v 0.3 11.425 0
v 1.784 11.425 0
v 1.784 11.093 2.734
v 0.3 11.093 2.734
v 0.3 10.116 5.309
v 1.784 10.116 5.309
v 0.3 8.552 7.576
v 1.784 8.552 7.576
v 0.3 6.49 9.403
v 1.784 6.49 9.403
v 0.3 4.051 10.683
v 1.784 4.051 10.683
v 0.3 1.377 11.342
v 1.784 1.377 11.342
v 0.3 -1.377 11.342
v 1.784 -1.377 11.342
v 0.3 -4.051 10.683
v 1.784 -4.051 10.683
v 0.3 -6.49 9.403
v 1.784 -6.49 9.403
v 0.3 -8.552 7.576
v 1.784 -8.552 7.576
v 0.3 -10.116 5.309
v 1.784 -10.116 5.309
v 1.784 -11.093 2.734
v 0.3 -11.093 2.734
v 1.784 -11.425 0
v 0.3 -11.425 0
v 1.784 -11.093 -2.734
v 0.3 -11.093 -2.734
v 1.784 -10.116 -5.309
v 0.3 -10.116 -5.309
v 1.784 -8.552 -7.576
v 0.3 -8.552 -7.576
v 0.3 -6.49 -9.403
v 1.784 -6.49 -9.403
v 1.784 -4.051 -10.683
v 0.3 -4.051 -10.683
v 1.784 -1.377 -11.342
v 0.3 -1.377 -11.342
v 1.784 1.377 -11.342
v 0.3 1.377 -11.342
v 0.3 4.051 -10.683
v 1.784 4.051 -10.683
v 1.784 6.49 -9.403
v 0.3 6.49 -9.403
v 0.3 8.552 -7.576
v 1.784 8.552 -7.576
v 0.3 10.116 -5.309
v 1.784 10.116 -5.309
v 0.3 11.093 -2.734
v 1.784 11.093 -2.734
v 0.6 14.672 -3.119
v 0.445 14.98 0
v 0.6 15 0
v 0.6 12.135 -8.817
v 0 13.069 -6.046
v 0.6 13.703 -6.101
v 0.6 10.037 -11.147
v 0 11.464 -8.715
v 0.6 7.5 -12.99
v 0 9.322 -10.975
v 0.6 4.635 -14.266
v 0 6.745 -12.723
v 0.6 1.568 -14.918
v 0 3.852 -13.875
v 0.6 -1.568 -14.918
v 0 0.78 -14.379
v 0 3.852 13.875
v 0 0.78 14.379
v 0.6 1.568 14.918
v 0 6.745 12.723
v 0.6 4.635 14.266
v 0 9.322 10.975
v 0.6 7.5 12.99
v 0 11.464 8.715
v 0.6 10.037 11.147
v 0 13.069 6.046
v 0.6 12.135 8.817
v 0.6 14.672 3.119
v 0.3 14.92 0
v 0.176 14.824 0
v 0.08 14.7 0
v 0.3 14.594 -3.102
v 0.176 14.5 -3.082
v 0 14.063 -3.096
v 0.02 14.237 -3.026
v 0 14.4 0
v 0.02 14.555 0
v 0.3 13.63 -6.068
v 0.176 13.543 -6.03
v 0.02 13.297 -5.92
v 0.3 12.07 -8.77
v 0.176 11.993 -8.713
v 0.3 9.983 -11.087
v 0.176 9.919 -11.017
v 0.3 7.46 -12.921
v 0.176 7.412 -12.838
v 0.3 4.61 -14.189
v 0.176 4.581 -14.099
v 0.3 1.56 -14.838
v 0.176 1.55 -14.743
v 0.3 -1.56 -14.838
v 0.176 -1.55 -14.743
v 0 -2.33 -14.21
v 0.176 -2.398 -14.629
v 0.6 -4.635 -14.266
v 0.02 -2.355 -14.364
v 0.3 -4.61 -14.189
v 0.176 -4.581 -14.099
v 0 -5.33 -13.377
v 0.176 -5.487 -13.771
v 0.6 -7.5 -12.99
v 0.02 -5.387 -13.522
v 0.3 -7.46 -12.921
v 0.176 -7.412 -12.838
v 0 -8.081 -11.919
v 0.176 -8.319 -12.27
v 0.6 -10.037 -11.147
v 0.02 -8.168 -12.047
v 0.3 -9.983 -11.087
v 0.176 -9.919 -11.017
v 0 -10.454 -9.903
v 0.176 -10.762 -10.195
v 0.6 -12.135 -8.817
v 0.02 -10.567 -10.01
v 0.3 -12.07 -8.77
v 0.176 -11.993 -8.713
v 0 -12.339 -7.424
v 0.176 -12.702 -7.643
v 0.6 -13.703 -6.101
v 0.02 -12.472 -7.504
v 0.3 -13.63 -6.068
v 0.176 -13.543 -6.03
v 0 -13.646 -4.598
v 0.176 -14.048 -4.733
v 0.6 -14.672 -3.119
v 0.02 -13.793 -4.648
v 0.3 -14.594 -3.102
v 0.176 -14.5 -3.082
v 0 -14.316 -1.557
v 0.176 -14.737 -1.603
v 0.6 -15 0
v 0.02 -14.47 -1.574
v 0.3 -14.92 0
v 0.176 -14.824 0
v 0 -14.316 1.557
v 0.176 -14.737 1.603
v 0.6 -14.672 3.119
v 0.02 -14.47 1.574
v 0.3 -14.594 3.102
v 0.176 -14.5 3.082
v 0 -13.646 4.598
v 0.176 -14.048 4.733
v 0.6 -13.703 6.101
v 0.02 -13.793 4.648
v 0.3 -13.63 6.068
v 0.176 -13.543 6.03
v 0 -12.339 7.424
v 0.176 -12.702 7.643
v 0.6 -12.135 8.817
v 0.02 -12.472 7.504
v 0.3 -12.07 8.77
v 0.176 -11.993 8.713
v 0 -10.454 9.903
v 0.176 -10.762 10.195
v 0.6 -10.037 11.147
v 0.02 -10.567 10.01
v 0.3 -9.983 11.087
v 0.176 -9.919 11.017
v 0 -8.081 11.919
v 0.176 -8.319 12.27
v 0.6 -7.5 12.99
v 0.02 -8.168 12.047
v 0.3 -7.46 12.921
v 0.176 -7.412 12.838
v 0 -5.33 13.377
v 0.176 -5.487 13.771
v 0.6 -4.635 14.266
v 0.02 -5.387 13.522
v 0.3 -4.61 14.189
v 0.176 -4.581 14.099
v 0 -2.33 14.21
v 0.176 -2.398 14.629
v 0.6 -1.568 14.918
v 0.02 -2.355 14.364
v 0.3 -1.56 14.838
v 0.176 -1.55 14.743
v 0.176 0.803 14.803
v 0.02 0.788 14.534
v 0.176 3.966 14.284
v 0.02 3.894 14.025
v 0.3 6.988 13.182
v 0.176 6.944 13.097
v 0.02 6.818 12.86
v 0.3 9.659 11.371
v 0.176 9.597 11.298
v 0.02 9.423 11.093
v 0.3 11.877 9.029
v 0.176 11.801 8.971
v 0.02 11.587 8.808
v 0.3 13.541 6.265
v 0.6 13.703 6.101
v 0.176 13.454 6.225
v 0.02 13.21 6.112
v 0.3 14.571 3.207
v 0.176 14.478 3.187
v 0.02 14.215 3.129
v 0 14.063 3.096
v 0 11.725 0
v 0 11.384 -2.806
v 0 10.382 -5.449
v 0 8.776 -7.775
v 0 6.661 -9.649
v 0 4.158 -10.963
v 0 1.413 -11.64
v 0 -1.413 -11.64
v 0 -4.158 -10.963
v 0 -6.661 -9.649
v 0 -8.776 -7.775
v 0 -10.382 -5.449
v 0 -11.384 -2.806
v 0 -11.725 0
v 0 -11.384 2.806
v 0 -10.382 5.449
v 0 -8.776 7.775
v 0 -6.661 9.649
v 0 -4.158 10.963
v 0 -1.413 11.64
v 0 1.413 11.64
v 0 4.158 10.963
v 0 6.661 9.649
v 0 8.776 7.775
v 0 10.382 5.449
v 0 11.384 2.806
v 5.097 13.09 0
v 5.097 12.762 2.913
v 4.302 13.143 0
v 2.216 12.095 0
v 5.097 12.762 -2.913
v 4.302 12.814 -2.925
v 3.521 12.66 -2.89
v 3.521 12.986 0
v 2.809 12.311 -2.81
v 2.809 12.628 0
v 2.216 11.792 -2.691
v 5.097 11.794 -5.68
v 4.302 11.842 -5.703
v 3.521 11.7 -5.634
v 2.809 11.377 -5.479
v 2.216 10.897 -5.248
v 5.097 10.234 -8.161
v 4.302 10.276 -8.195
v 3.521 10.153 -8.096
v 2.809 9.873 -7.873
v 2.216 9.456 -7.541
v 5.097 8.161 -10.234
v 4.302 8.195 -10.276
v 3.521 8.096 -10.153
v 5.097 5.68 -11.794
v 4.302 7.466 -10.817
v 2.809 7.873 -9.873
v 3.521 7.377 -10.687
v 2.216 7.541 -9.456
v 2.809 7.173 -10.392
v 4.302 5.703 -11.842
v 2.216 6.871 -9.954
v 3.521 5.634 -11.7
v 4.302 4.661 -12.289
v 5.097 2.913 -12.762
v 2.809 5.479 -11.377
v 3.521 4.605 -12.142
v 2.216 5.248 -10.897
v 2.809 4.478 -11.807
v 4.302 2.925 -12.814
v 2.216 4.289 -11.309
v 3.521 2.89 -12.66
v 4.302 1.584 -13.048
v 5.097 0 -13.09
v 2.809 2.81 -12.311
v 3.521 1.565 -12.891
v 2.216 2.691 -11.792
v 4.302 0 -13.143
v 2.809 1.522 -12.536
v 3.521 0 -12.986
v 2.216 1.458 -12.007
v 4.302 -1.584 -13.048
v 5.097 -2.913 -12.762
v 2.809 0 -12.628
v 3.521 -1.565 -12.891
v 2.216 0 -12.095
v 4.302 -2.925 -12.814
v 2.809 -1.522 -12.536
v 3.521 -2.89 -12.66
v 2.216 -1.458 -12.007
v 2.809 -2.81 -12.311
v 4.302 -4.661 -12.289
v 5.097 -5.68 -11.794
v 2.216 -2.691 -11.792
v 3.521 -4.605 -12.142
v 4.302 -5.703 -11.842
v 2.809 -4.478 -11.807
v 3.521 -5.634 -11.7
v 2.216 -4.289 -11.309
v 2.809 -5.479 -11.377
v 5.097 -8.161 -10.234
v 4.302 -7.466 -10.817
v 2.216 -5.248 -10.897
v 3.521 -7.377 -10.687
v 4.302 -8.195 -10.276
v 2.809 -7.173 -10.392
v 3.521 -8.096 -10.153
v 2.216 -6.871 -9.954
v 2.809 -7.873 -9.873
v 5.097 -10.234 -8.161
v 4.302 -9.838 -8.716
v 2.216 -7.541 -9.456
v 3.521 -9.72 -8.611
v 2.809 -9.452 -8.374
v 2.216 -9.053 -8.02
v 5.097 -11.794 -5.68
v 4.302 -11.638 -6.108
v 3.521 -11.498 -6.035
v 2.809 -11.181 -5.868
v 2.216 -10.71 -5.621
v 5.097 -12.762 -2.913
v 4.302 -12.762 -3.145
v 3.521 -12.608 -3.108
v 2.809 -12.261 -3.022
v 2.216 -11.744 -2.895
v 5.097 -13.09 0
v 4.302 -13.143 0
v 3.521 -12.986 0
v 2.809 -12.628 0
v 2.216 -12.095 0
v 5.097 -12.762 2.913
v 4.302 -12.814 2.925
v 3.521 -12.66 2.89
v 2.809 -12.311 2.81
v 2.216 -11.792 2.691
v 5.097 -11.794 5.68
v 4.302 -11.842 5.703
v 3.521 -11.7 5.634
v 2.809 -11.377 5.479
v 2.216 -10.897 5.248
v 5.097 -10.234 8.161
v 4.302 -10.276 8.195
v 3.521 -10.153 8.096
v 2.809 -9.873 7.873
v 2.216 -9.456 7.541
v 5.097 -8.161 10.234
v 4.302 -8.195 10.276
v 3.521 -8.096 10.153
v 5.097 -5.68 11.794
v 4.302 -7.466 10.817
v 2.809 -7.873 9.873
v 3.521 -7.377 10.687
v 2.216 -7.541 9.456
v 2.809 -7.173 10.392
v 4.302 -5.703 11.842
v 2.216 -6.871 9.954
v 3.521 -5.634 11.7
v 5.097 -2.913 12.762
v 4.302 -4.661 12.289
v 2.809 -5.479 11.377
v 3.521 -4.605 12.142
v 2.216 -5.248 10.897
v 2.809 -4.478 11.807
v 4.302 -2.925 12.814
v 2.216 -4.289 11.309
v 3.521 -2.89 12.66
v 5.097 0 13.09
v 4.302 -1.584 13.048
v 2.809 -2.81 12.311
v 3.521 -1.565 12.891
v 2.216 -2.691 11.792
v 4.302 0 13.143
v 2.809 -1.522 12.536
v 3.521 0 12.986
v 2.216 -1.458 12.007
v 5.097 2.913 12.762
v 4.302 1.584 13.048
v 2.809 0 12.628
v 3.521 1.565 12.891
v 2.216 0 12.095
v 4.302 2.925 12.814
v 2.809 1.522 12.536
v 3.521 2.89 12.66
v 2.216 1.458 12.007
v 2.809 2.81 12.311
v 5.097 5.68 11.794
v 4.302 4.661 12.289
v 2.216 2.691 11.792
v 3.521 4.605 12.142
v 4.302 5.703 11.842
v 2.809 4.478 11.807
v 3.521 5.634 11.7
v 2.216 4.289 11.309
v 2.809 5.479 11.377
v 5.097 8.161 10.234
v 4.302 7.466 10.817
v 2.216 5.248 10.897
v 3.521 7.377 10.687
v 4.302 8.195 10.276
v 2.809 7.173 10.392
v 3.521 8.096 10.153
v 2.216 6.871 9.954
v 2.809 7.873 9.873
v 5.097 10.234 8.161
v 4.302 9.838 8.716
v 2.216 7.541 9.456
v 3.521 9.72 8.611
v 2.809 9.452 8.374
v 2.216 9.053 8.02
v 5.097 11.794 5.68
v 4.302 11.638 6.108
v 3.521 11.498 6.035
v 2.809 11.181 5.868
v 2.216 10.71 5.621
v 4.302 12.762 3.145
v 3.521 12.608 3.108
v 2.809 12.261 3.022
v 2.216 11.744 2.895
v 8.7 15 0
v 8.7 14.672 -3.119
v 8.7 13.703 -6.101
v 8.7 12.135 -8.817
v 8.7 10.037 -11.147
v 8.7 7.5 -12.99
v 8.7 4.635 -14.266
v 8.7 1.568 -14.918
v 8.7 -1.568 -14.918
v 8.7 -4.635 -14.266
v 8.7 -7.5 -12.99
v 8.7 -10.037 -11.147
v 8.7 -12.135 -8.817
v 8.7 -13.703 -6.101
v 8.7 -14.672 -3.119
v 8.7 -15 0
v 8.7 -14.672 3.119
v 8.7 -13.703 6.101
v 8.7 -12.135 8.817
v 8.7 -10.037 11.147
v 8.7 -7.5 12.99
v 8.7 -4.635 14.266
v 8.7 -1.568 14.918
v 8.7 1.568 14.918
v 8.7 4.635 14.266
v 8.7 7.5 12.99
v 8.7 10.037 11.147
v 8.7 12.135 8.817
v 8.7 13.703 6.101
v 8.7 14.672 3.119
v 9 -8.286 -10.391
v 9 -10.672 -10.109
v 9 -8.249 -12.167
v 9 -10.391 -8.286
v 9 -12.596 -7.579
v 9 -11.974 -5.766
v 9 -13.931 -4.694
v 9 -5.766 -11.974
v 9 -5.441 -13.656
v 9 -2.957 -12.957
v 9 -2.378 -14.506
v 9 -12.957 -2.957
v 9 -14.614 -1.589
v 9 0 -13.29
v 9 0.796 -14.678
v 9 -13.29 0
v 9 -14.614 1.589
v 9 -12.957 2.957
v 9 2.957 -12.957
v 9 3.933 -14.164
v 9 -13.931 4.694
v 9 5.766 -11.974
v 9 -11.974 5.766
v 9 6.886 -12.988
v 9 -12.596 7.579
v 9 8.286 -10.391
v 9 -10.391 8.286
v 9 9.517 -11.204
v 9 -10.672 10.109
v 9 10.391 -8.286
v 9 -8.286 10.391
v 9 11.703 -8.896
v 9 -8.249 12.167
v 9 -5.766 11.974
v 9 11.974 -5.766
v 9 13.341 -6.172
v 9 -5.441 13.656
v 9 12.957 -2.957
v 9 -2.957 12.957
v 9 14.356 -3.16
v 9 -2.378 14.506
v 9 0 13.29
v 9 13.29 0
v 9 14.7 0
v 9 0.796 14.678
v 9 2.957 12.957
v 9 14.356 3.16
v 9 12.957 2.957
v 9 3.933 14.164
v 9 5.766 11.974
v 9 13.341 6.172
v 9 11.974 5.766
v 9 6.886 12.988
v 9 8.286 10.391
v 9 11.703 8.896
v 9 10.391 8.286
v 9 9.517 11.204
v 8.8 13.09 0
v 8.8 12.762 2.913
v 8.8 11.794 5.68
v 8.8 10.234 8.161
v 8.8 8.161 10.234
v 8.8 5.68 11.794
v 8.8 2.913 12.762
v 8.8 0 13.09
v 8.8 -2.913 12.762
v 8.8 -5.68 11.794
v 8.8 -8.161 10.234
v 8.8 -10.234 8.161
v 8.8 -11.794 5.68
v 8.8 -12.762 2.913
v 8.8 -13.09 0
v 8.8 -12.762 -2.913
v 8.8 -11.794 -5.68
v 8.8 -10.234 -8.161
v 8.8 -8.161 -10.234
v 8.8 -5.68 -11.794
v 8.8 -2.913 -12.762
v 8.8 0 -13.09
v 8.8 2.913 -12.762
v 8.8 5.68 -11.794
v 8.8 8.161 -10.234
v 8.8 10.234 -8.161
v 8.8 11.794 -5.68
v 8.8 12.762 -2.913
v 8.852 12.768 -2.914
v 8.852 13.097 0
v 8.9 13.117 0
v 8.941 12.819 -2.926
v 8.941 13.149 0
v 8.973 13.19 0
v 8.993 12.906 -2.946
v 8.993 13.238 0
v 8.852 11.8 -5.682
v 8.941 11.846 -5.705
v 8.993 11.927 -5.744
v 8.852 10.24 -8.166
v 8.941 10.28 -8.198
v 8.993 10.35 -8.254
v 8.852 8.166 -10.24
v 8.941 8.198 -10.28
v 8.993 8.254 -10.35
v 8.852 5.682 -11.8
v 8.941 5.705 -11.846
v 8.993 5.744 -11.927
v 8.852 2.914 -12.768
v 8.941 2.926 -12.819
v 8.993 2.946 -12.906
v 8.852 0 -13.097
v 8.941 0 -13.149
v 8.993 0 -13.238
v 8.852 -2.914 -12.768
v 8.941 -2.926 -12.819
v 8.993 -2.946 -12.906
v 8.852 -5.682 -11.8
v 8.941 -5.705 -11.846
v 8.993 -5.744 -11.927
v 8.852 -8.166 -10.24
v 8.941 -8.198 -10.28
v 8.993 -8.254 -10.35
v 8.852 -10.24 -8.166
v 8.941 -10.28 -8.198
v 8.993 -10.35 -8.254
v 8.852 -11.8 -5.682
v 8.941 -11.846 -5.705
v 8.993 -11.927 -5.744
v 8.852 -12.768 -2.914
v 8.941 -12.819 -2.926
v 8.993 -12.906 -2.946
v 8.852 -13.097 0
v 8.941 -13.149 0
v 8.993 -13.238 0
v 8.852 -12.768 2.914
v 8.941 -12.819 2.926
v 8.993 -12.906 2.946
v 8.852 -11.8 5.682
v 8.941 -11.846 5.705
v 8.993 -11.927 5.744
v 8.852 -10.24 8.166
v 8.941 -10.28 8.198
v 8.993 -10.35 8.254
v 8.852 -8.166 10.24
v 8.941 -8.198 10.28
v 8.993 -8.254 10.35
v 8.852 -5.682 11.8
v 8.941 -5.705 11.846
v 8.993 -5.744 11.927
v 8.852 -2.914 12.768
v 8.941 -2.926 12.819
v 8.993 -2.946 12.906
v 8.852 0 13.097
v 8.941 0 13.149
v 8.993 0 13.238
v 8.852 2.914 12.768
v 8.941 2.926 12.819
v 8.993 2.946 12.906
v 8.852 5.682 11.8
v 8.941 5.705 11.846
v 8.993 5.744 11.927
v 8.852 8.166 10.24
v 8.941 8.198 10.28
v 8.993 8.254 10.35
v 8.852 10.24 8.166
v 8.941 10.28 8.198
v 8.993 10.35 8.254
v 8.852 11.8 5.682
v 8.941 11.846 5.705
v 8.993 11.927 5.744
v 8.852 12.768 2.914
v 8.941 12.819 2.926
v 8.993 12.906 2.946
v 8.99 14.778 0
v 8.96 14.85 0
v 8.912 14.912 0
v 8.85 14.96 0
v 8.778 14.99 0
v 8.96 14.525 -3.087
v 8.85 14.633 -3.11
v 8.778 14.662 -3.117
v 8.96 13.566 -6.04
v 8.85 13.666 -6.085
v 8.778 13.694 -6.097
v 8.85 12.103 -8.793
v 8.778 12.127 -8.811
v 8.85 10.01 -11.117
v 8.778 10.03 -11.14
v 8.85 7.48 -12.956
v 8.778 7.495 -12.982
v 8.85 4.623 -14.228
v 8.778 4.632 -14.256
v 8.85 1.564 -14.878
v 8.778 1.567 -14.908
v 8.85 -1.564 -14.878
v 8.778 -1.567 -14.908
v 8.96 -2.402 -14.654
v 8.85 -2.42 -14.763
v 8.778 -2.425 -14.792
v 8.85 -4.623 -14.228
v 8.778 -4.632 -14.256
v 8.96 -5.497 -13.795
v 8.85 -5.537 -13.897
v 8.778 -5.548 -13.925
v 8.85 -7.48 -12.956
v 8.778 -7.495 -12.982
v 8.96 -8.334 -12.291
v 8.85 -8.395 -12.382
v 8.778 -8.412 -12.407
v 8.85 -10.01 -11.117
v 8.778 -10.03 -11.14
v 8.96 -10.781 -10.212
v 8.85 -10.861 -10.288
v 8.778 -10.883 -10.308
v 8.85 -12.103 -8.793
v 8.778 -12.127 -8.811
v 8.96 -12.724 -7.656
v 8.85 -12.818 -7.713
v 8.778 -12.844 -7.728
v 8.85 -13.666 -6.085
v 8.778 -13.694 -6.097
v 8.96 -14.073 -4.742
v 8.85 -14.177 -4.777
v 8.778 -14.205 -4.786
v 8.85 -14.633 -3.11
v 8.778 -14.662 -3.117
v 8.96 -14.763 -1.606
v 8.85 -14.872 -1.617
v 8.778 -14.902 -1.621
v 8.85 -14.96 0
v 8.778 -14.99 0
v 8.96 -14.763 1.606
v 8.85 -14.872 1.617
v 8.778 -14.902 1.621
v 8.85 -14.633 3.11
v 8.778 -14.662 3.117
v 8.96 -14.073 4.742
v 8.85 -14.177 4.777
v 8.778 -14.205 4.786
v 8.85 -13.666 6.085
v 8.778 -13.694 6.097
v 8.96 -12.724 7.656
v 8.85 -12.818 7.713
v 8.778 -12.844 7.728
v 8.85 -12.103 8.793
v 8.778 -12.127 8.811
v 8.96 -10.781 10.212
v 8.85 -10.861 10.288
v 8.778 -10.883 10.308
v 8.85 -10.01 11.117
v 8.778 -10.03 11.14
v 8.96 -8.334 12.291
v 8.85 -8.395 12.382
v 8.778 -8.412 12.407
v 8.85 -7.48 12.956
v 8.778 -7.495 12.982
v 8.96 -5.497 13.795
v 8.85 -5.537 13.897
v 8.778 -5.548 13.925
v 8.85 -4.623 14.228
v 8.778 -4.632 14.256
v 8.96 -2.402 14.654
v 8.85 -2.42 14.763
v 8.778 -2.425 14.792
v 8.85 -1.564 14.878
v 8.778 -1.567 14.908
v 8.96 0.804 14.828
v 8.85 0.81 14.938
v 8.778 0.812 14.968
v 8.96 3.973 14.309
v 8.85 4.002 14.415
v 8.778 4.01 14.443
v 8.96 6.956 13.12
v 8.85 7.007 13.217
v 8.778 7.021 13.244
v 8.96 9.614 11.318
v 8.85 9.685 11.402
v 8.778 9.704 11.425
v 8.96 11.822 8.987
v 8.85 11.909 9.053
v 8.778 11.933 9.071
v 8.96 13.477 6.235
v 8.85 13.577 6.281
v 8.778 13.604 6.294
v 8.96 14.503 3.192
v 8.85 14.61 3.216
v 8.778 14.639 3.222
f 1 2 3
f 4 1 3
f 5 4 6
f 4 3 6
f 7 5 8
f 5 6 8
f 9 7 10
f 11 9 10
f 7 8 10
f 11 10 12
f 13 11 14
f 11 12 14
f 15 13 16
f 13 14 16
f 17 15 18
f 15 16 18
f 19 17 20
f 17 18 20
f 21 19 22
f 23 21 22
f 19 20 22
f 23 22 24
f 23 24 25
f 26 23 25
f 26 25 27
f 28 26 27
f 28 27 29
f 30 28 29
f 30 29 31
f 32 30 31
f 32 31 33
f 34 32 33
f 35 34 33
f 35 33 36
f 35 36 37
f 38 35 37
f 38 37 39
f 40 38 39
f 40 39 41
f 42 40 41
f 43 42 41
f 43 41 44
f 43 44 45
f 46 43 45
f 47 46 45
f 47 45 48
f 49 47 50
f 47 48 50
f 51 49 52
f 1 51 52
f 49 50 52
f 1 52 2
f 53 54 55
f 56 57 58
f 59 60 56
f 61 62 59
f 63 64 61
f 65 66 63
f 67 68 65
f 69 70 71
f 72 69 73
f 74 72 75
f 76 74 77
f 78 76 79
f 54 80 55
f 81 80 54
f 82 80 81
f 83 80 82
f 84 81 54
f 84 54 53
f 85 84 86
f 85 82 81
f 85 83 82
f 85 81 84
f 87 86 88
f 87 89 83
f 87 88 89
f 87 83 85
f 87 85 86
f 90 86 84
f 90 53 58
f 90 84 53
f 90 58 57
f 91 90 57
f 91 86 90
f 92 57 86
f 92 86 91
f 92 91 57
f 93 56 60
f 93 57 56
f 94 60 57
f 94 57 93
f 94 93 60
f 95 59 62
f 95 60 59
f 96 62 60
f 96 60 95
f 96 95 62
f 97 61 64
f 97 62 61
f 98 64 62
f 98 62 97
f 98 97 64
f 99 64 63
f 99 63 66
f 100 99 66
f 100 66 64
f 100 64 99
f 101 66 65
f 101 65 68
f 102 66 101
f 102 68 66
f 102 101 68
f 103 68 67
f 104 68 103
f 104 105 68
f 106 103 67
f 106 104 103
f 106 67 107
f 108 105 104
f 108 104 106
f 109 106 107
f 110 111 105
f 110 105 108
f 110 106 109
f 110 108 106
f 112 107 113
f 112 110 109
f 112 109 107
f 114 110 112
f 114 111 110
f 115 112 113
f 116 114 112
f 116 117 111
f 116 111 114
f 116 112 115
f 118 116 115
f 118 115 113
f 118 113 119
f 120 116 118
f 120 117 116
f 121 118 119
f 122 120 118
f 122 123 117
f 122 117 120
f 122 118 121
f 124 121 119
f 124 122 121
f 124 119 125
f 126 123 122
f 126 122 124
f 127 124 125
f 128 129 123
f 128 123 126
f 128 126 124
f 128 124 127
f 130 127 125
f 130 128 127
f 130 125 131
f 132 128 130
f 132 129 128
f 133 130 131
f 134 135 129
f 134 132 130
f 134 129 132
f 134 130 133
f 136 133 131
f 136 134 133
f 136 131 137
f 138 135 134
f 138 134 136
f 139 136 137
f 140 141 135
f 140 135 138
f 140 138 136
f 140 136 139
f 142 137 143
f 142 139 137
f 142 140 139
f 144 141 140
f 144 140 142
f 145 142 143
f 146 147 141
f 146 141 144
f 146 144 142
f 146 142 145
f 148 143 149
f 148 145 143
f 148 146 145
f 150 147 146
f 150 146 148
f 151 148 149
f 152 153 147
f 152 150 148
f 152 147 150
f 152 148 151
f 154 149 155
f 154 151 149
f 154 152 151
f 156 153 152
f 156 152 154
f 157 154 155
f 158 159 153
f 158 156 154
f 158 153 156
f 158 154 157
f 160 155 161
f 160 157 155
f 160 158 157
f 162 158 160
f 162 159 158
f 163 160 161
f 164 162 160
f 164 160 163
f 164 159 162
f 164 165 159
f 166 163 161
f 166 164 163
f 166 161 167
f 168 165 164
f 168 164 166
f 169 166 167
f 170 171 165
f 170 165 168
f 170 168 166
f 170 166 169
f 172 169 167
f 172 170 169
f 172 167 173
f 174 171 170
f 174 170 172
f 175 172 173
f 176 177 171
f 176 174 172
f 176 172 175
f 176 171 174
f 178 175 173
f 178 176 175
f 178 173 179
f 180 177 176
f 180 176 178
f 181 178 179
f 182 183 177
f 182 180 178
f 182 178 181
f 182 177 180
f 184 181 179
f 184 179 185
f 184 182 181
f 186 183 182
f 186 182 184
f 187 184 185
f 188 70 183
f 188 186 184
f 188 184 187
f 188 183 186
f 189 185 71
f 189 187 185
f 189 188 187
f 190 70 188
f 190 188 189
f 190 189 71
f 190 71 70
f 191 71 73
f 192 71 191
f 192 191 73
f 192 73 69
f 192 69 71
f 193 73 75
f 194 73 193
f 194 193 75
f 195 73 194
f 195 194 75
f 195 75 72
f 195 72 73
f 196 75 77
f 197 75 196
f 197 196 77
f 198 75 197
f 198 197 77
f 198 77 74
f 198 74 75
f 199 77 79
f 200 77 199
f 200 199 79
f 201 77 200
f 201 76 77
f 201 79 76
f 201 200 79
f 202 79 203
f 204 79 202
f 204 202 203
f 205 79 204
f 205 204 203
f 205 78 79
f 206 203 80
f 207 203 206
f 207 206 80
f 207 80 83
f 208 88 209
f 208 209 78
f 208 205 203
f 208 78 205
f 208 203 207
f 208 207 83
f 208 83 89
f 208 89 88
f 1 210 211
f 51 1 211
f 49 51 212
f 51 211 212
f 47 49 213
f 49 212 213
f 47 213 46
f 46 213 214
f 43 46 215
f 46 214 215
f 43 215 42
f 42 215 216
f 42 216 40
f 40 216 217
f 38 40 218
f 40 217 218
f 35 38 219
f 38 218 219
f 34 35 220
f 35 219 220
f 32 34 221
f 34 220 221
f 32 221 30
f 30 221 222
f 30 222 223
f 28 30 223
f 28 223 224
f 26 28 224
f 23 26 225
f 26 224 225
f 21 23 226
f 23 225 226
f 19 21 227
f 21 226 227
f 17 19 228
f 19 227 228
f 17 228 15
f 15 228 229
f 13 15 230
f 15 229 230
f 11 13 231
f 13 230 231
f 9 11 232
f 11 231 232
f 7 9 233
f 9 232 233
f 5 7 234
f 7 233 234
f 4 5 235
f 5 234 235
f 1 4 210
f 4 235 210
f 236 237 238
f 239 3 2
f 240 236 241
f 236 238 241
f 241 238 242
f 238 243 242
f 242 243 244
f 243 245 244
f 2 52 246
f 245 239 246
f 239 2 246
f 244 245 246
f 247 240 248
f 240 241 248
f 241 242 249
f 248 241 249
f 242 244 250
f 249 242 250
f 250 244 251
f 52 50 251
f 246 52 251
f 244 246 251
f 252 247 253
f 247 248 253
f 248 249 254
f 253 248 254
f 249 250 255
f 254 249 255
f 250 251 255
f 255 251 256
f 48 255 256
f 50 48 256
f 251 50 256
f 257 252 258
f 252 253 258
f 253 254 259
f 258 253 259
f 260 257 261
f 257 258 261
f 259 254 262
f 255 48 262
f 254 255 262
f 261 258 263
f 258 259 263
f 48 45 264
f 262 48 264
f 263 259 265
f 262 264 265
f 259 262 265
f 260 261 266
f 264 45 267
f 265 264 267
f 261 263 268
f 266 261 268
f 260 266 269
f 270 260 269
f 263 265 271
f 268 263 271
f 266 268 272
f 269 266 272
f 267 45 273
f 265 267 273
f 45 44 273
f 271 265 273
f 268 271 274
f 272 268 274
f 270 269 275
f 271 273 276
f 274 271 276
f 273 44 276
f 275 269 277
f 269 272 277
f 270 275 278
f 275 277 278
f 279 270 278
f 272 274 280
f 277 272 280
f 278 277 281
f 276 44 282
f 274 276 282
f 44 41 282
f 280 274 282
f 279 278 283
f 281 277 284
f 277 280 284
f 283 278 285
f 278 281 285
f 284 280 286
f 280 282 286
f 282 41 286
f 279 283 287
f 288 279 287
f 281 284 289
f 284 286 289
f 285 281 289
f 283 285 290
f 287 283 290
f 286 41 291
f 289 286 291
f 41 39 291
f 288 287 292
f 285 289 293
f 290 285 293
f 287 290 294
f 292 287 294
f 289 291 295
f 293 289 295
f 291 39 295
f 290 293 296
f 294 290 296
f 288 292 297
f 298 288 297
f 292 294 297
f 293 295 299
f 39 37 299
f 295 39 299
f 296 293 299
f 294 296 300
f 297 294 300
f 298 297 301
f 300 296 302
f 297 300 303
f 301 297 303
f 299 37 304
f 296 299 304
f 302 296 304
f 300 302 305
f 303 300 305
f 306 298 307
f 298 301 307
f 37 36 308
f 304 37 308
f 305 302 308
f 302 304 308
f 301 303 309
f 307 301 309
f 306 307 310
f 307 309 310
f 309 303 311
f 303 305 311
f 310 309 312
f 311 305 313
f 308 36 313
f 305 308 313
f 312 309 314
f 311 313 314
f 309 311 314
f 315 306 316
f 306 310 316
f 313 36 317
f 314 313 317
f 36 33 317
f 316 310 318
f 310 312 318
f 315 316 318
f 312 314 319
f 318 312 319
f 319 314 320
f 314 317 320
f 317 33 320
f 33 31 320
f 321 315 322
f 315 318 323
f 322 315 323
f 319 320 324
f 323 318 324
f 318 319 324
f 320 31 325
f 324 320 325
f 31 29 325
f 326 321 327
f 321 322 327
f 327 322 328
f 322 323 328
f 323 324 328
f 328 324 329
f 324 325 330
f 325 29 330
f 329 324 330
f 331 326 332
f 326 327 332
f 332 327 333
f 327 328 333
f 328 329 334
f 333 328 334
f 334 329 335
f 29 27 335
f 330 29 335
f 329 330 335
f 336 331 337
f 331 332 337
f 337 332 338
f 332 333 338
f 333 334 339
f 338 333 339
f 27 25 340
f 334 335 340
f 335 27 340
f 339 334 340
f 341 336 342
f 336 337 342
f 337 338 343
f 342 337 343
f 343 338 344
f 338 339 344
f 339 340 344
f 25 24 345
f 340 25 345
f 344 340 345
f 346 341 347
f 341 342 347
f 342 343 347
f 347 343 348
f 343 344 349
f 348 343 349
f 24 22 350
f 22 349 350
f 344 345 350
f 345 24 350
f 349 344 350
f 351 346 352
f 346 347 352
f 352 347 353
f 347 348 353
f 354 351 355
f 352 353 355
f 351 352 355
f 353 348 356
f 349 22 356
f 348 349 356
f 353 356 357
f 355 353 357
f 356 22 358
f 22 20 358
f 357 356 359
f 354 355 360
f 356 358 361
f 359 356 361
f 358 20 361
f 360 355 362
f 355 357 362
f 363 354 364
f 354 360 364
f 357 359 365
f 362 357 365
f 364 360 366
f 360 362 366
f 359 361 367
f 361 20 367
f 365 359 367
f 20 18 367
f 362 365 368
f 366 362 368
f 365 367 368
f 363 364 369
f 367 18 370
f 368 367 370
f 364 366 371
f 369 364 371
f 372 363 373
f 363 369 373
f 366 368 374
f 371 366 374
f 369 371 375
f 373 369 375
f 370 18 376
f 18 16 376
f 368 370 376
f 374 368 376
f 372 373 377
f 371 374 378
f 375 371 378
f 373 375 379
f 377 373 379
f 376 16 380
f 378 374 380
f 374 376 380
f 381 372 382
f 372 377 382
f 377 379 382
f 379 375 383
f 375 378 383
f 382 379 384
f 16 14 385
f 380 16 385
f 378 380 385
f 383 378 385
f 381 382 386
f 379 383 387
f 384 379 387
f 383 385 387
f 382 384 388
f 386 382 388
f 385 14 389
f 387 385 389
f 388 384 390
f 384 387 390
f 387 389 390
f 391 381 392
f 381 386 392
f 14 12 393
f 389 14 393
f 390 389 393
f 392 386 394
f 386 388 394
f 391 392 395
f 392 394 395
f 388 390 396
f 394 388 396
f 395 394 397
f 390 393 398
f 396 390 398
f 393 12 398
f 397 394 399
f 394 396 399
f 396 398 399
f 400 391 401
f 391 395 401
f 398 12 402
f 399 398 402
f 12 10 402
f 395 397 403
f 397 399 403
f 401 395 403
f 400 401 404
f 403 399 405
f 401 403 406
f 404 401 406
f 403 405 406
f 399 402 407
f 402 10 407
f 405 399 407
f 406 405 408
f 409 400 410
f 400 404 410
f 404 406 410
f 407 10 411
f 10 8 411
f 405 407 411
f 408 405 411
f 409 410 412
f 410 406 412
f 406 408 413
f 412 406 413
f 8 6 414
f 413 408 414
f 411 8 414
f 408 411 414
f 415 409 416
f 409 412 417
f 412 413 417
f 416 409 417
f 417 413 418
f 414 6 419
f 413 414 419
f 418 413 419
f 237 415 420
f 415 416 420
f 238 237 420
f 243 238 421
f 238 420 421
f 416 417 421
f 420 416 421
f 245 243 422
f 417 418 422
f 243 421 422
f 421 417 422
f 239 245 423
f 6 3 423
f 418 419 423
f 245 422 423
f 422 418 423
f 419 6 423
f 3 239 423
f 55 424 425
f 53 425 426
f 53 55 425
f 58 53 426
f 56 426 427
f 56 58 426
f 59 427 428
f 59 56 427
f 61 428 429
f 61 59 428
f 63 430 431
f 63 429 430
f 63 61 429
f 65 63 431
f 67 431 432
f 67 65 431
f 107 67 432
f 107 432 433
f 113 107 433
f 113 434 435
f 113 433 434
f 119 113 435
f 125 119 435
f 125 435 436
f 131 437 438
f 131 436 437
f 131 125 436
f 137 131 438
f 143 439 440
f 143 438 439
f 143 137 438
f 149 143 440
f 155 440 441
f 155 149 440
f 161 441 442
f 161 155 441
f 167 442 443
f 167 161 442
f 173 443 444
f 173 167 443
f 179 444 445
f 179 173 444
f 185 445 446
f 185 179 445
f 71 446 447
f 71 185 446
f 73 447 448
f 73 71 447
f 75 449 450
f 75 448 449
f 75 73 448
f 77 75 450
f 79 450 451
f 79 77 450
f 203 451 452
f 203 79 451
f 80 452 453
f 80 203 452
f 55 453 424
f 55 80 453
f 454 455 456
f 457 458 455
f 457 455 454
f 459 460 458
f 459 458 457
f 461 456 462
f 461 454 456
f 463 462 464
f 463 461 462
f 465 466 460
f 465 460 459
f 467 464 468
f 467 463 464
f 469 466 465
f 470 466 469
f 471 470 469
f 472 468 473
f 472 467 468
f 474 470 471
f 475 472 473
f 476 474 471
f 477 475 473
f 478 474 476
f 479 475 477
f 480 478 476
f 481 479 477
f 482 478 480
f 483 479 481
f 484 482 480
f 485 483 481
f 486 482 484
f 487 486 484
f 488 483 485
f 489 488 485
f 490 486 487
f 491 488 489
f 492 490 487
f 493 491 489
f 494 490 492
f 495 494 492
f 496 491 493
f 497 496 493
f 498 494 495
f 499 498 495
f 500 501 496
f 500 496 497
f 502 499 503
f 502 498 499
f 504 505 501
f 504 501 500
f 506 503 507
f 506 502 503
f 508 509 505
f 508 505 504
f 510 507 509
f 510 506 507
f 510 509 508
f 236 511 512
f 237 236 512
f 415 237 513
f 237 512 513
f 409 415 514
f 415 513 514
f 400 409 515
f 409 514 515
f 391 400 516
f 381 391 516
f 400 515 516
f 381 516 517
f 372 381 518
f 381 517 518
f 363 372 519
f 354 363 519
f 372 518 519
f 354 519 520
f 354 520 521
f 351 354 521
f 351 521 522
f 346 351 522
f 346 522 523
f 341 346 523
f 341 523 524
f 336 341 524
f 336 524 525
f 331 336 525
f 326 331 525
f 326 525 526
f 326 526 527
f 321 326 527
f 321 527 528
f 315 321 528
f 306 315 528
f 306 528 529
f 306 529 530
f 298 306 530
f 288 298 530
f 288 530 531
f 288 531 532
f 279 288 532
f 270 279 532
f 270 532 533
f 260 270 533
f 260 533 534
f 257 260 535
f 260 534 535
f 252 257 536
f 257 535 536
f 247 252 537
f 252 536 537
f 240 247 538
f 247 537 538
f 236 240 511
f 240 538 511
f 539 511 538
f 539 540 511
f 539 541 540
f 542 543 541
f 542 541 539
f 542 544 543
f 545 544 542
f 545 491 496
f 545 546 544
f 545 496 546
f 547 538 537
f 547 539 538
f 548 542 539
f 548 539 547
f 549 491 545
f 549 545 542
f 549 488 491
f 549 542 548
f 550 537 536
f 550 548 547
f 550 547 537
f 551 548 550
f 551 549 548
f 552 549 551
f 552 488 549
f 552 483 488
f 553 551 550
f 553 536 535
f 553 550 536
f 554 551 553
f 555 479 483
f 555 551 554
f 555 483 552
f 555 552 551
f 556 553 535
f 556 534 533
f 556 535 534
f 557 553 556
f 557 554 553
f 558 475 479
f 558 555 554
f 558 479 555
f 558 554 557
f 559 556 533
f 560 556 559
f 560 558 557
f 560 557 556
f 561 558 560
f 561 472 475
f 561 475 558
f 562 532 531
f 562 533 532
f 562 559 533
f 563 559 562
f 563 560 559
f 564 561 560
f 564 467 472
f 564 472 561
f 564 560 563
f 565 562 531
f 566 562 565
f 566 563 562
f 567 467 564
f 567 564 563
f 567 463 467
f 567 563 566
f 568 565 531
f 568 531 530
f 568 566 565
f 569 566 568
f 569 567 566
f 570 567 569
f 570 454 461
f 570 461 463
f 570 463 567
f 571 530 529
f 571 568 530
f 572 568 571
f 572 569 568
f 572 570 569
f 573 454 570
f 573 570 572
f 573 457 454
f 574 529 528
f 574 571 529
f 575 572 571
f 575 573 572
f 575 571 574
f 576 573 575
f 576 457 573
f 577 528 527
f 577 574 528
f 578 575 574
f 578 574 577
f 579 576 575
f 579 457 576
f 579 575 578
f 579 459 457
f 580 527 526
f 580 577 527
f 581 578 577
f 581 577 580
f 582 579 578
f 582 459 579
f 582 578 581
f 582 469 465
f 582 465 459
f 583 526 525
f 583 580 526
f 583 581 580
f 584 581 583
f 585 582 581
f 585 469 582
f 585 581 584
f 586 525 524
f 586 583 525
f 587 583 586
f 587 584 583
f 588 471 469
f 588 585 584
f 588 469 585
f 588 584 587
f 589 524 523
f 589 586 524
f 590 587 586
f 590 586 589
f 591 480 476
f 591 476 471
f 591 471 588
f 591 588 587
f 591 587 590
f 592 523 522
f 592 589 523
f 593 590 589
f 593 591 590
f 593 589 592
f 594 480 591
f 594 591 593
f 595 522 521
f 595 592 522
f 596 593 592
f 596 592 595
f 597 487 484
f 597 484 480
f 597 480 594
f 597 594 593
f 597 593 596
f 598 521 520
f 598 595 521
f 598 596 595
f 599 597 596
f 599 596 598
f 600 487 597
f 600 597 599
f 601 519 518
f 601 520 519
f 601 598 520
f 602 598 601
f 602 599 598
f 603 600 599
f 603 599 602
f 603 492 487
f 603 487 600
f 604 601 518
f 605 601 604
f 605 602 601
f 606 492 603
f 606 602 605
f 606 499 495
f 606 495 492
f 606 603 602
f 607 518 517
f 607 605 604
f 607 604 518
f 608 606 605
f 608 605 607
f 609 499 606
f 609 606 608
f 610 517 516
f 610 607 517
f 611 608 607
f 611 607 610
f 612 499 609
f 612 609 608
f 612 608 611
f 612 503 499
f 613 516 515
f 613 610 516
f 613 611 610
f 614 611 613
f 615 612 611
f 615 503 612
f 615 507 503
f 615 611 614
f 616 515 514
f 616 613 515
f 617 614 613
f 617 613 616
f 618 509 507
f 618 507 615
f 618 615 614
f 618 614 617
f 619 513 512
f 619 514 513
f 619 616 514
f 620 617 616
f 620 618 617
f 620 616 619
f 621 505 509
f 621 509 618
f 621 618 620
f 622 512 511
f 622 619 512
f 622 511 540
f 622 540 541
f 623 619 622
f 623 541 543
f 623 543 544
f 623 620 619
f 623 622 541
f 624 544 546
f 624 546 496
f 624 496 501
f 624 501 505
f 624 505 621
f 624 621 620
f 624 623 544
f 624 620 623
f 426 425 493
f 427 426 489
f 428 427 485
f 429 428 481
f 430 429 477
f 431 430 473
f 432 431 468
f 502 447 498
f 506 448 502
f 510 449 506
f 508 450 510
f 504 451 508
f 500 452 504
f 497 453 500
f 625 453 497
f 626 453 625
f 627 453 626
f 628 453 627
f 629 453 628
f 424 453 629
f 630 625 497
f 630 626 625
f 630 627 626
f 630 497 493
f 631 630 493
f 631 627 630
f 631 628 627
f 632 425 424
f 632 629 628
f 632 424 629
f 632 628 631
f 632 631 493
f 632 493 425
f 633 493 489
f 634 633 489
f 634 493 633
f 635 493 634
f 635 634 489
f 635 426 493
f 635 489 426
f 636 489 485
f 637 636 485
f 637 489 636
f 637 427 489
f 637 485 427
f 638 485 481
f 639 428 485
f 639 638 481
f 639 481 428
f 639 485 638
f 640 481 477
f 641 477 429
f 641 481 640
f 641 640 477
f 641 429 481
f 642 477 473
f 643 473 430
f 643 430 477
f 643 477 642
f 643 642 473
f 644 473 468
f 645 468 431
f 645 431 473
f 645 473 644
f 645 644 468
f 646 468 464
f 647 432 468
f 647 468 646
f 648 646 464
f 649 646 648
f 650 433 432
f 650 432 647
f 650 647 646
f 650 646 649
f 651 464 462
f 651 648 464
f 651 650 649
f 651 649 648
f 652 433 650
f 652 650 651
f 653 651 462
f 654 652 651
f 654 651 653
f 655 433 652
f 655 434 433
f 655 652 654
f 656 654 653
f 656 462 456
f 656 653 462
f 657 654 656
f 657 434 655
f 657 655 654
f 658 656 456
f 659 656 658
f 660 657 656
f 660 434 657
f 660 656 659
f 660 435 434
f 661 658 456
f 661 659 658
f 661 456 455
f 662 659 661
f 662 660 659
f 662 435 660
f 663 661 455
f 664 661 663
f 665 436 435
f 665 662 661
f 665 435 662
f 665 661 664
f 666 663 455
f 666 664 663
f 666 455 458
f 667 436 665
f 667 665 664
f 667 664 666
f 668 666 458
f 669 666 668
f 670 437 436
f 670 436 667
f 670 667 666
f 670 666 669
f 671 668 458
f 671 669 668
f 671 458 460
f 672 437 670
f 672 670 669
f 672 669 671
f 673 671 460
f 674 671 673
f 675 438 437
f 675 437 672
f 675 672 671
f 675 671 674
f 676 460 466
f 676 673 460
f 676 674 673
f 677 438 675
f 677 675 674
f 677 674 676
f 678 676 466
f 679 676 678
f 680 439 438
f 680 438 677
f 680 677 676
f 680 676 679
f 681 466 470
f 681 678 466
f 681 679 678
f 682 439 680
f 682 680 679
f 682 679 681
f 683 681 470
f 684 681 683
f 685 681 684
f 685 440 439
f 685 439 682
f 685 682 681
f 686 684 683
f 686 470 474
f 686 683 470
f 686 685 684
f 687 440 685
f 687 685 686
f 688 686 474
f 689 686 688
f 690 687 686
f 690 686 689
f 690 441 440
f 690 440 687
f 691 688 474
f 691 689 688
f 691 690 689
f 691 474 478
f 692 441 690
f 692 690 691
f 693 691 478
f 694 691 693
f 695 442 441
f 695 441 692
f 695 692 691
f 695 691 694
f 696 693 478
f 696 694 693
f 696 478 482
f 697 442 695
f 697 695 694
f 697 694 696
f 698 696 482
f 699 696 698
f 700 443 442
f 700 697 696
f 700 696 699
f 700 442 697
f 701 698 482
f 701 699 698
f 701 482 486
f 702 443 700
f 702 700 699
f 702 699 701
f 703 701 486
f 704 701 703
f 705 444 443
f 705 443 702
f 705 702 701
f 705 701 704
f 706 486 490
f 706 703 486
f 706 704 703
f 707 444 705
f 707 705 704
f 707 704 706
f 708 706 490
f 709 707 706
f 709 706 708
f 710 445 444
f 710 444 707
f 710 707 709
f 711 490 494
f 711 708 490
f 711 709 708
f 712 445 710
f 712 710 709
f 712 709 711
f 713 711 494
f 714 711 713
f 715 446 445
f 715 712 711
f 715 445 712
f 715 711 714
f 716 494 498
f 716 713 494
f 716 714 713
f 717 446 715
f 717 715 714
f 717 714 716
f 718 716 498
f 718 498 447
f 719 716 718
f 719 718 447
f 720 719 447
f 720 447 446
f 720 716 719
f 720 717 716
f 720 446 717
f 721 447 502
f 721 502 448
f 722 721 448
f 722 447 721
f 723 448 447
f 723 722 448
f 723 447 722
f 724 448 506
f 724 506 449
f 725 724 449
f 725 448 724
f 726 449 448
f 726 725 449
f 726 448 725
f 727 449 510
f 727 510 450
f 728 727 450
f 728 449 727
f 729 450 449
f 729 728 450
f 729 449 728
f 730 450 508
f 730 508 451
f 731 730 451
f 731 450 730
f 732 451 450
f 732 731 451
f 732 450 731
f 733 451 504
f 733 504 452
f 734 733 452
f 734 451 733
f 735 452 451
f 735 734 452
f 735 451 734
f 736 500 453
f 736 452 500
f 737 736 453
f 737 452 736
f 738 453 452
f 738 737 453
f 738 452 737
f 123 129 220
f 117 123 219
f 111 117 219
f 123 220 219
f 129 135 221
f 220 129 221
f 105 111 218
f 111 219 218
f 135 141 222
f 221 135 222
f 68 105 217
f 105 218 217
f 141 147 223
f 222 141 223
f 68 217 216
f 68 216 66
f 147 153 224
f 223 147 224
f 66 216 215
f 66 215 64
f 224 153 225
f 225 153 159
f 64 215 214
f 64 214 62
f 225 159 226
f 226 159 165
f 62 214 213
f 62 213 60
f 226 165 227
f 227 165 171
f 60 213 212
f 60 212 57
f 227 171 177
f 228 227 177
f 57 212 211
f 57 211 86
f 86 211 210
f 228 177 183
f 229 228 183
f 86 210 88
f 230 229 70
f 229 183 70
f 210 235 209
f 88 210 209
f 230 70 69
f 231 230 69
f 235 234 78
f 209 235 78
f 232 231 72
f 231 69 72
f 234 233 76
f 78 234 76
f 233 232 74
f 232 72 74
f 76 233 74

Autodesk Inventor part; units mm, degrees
ref_plane "YZ Plane" through (0, 0, 0) normal (1, 0, 0) x (0, 1, 0)
ref_plane "XZ Plane" through (0, 0, 0) normal (0, 1, 0) x (-1, 0, 0)
ref_plane "XY Plane" through (0, 0, 0) normal (0, 0, 1) x (1, 0, 0)
sketch "Sketch_1" plane through (0, 0, 0) normal (0, 0, 1) x (1, 0, 0)
  line L0 (9, 0) -> (0, 0)
  line L1 (0, 11.725) -> (0.3, 11.425)
  line L2 (0.3, 11.425) -> (1.7844, 11.425)
  arc A0 (5.097, 13.09) -> (1.7844, 11.425) centre (4.5, 10.15) ccw
  line L3 (5.097, 13.09) -> (8.8, 13.09)
  arc A1 (8.8, 13.09) -> (9, 13.29) centre (8.8, 13.29) ccw
  line L4 (9, 13.29) -> (9, 14.7)
  arc A2 (9, 14.7) -> (8.7, 15) centre (8.7, 14.7) ccw
  line L5 (8.7, 15) -> (0.6, 15)
  arc A3 (0.6, 15) -> (0, 14.4) centre (0.6, 14.4) ccw
  line L6 (0, 14.4) -> (0, 11.725)
revolve "Revolution1" add sketch "Sketch_1" angle 360 about axis through (9, 0, 0) along (1, 0, 0)
properties part number "SKF_7200 BECBP_PART2"
